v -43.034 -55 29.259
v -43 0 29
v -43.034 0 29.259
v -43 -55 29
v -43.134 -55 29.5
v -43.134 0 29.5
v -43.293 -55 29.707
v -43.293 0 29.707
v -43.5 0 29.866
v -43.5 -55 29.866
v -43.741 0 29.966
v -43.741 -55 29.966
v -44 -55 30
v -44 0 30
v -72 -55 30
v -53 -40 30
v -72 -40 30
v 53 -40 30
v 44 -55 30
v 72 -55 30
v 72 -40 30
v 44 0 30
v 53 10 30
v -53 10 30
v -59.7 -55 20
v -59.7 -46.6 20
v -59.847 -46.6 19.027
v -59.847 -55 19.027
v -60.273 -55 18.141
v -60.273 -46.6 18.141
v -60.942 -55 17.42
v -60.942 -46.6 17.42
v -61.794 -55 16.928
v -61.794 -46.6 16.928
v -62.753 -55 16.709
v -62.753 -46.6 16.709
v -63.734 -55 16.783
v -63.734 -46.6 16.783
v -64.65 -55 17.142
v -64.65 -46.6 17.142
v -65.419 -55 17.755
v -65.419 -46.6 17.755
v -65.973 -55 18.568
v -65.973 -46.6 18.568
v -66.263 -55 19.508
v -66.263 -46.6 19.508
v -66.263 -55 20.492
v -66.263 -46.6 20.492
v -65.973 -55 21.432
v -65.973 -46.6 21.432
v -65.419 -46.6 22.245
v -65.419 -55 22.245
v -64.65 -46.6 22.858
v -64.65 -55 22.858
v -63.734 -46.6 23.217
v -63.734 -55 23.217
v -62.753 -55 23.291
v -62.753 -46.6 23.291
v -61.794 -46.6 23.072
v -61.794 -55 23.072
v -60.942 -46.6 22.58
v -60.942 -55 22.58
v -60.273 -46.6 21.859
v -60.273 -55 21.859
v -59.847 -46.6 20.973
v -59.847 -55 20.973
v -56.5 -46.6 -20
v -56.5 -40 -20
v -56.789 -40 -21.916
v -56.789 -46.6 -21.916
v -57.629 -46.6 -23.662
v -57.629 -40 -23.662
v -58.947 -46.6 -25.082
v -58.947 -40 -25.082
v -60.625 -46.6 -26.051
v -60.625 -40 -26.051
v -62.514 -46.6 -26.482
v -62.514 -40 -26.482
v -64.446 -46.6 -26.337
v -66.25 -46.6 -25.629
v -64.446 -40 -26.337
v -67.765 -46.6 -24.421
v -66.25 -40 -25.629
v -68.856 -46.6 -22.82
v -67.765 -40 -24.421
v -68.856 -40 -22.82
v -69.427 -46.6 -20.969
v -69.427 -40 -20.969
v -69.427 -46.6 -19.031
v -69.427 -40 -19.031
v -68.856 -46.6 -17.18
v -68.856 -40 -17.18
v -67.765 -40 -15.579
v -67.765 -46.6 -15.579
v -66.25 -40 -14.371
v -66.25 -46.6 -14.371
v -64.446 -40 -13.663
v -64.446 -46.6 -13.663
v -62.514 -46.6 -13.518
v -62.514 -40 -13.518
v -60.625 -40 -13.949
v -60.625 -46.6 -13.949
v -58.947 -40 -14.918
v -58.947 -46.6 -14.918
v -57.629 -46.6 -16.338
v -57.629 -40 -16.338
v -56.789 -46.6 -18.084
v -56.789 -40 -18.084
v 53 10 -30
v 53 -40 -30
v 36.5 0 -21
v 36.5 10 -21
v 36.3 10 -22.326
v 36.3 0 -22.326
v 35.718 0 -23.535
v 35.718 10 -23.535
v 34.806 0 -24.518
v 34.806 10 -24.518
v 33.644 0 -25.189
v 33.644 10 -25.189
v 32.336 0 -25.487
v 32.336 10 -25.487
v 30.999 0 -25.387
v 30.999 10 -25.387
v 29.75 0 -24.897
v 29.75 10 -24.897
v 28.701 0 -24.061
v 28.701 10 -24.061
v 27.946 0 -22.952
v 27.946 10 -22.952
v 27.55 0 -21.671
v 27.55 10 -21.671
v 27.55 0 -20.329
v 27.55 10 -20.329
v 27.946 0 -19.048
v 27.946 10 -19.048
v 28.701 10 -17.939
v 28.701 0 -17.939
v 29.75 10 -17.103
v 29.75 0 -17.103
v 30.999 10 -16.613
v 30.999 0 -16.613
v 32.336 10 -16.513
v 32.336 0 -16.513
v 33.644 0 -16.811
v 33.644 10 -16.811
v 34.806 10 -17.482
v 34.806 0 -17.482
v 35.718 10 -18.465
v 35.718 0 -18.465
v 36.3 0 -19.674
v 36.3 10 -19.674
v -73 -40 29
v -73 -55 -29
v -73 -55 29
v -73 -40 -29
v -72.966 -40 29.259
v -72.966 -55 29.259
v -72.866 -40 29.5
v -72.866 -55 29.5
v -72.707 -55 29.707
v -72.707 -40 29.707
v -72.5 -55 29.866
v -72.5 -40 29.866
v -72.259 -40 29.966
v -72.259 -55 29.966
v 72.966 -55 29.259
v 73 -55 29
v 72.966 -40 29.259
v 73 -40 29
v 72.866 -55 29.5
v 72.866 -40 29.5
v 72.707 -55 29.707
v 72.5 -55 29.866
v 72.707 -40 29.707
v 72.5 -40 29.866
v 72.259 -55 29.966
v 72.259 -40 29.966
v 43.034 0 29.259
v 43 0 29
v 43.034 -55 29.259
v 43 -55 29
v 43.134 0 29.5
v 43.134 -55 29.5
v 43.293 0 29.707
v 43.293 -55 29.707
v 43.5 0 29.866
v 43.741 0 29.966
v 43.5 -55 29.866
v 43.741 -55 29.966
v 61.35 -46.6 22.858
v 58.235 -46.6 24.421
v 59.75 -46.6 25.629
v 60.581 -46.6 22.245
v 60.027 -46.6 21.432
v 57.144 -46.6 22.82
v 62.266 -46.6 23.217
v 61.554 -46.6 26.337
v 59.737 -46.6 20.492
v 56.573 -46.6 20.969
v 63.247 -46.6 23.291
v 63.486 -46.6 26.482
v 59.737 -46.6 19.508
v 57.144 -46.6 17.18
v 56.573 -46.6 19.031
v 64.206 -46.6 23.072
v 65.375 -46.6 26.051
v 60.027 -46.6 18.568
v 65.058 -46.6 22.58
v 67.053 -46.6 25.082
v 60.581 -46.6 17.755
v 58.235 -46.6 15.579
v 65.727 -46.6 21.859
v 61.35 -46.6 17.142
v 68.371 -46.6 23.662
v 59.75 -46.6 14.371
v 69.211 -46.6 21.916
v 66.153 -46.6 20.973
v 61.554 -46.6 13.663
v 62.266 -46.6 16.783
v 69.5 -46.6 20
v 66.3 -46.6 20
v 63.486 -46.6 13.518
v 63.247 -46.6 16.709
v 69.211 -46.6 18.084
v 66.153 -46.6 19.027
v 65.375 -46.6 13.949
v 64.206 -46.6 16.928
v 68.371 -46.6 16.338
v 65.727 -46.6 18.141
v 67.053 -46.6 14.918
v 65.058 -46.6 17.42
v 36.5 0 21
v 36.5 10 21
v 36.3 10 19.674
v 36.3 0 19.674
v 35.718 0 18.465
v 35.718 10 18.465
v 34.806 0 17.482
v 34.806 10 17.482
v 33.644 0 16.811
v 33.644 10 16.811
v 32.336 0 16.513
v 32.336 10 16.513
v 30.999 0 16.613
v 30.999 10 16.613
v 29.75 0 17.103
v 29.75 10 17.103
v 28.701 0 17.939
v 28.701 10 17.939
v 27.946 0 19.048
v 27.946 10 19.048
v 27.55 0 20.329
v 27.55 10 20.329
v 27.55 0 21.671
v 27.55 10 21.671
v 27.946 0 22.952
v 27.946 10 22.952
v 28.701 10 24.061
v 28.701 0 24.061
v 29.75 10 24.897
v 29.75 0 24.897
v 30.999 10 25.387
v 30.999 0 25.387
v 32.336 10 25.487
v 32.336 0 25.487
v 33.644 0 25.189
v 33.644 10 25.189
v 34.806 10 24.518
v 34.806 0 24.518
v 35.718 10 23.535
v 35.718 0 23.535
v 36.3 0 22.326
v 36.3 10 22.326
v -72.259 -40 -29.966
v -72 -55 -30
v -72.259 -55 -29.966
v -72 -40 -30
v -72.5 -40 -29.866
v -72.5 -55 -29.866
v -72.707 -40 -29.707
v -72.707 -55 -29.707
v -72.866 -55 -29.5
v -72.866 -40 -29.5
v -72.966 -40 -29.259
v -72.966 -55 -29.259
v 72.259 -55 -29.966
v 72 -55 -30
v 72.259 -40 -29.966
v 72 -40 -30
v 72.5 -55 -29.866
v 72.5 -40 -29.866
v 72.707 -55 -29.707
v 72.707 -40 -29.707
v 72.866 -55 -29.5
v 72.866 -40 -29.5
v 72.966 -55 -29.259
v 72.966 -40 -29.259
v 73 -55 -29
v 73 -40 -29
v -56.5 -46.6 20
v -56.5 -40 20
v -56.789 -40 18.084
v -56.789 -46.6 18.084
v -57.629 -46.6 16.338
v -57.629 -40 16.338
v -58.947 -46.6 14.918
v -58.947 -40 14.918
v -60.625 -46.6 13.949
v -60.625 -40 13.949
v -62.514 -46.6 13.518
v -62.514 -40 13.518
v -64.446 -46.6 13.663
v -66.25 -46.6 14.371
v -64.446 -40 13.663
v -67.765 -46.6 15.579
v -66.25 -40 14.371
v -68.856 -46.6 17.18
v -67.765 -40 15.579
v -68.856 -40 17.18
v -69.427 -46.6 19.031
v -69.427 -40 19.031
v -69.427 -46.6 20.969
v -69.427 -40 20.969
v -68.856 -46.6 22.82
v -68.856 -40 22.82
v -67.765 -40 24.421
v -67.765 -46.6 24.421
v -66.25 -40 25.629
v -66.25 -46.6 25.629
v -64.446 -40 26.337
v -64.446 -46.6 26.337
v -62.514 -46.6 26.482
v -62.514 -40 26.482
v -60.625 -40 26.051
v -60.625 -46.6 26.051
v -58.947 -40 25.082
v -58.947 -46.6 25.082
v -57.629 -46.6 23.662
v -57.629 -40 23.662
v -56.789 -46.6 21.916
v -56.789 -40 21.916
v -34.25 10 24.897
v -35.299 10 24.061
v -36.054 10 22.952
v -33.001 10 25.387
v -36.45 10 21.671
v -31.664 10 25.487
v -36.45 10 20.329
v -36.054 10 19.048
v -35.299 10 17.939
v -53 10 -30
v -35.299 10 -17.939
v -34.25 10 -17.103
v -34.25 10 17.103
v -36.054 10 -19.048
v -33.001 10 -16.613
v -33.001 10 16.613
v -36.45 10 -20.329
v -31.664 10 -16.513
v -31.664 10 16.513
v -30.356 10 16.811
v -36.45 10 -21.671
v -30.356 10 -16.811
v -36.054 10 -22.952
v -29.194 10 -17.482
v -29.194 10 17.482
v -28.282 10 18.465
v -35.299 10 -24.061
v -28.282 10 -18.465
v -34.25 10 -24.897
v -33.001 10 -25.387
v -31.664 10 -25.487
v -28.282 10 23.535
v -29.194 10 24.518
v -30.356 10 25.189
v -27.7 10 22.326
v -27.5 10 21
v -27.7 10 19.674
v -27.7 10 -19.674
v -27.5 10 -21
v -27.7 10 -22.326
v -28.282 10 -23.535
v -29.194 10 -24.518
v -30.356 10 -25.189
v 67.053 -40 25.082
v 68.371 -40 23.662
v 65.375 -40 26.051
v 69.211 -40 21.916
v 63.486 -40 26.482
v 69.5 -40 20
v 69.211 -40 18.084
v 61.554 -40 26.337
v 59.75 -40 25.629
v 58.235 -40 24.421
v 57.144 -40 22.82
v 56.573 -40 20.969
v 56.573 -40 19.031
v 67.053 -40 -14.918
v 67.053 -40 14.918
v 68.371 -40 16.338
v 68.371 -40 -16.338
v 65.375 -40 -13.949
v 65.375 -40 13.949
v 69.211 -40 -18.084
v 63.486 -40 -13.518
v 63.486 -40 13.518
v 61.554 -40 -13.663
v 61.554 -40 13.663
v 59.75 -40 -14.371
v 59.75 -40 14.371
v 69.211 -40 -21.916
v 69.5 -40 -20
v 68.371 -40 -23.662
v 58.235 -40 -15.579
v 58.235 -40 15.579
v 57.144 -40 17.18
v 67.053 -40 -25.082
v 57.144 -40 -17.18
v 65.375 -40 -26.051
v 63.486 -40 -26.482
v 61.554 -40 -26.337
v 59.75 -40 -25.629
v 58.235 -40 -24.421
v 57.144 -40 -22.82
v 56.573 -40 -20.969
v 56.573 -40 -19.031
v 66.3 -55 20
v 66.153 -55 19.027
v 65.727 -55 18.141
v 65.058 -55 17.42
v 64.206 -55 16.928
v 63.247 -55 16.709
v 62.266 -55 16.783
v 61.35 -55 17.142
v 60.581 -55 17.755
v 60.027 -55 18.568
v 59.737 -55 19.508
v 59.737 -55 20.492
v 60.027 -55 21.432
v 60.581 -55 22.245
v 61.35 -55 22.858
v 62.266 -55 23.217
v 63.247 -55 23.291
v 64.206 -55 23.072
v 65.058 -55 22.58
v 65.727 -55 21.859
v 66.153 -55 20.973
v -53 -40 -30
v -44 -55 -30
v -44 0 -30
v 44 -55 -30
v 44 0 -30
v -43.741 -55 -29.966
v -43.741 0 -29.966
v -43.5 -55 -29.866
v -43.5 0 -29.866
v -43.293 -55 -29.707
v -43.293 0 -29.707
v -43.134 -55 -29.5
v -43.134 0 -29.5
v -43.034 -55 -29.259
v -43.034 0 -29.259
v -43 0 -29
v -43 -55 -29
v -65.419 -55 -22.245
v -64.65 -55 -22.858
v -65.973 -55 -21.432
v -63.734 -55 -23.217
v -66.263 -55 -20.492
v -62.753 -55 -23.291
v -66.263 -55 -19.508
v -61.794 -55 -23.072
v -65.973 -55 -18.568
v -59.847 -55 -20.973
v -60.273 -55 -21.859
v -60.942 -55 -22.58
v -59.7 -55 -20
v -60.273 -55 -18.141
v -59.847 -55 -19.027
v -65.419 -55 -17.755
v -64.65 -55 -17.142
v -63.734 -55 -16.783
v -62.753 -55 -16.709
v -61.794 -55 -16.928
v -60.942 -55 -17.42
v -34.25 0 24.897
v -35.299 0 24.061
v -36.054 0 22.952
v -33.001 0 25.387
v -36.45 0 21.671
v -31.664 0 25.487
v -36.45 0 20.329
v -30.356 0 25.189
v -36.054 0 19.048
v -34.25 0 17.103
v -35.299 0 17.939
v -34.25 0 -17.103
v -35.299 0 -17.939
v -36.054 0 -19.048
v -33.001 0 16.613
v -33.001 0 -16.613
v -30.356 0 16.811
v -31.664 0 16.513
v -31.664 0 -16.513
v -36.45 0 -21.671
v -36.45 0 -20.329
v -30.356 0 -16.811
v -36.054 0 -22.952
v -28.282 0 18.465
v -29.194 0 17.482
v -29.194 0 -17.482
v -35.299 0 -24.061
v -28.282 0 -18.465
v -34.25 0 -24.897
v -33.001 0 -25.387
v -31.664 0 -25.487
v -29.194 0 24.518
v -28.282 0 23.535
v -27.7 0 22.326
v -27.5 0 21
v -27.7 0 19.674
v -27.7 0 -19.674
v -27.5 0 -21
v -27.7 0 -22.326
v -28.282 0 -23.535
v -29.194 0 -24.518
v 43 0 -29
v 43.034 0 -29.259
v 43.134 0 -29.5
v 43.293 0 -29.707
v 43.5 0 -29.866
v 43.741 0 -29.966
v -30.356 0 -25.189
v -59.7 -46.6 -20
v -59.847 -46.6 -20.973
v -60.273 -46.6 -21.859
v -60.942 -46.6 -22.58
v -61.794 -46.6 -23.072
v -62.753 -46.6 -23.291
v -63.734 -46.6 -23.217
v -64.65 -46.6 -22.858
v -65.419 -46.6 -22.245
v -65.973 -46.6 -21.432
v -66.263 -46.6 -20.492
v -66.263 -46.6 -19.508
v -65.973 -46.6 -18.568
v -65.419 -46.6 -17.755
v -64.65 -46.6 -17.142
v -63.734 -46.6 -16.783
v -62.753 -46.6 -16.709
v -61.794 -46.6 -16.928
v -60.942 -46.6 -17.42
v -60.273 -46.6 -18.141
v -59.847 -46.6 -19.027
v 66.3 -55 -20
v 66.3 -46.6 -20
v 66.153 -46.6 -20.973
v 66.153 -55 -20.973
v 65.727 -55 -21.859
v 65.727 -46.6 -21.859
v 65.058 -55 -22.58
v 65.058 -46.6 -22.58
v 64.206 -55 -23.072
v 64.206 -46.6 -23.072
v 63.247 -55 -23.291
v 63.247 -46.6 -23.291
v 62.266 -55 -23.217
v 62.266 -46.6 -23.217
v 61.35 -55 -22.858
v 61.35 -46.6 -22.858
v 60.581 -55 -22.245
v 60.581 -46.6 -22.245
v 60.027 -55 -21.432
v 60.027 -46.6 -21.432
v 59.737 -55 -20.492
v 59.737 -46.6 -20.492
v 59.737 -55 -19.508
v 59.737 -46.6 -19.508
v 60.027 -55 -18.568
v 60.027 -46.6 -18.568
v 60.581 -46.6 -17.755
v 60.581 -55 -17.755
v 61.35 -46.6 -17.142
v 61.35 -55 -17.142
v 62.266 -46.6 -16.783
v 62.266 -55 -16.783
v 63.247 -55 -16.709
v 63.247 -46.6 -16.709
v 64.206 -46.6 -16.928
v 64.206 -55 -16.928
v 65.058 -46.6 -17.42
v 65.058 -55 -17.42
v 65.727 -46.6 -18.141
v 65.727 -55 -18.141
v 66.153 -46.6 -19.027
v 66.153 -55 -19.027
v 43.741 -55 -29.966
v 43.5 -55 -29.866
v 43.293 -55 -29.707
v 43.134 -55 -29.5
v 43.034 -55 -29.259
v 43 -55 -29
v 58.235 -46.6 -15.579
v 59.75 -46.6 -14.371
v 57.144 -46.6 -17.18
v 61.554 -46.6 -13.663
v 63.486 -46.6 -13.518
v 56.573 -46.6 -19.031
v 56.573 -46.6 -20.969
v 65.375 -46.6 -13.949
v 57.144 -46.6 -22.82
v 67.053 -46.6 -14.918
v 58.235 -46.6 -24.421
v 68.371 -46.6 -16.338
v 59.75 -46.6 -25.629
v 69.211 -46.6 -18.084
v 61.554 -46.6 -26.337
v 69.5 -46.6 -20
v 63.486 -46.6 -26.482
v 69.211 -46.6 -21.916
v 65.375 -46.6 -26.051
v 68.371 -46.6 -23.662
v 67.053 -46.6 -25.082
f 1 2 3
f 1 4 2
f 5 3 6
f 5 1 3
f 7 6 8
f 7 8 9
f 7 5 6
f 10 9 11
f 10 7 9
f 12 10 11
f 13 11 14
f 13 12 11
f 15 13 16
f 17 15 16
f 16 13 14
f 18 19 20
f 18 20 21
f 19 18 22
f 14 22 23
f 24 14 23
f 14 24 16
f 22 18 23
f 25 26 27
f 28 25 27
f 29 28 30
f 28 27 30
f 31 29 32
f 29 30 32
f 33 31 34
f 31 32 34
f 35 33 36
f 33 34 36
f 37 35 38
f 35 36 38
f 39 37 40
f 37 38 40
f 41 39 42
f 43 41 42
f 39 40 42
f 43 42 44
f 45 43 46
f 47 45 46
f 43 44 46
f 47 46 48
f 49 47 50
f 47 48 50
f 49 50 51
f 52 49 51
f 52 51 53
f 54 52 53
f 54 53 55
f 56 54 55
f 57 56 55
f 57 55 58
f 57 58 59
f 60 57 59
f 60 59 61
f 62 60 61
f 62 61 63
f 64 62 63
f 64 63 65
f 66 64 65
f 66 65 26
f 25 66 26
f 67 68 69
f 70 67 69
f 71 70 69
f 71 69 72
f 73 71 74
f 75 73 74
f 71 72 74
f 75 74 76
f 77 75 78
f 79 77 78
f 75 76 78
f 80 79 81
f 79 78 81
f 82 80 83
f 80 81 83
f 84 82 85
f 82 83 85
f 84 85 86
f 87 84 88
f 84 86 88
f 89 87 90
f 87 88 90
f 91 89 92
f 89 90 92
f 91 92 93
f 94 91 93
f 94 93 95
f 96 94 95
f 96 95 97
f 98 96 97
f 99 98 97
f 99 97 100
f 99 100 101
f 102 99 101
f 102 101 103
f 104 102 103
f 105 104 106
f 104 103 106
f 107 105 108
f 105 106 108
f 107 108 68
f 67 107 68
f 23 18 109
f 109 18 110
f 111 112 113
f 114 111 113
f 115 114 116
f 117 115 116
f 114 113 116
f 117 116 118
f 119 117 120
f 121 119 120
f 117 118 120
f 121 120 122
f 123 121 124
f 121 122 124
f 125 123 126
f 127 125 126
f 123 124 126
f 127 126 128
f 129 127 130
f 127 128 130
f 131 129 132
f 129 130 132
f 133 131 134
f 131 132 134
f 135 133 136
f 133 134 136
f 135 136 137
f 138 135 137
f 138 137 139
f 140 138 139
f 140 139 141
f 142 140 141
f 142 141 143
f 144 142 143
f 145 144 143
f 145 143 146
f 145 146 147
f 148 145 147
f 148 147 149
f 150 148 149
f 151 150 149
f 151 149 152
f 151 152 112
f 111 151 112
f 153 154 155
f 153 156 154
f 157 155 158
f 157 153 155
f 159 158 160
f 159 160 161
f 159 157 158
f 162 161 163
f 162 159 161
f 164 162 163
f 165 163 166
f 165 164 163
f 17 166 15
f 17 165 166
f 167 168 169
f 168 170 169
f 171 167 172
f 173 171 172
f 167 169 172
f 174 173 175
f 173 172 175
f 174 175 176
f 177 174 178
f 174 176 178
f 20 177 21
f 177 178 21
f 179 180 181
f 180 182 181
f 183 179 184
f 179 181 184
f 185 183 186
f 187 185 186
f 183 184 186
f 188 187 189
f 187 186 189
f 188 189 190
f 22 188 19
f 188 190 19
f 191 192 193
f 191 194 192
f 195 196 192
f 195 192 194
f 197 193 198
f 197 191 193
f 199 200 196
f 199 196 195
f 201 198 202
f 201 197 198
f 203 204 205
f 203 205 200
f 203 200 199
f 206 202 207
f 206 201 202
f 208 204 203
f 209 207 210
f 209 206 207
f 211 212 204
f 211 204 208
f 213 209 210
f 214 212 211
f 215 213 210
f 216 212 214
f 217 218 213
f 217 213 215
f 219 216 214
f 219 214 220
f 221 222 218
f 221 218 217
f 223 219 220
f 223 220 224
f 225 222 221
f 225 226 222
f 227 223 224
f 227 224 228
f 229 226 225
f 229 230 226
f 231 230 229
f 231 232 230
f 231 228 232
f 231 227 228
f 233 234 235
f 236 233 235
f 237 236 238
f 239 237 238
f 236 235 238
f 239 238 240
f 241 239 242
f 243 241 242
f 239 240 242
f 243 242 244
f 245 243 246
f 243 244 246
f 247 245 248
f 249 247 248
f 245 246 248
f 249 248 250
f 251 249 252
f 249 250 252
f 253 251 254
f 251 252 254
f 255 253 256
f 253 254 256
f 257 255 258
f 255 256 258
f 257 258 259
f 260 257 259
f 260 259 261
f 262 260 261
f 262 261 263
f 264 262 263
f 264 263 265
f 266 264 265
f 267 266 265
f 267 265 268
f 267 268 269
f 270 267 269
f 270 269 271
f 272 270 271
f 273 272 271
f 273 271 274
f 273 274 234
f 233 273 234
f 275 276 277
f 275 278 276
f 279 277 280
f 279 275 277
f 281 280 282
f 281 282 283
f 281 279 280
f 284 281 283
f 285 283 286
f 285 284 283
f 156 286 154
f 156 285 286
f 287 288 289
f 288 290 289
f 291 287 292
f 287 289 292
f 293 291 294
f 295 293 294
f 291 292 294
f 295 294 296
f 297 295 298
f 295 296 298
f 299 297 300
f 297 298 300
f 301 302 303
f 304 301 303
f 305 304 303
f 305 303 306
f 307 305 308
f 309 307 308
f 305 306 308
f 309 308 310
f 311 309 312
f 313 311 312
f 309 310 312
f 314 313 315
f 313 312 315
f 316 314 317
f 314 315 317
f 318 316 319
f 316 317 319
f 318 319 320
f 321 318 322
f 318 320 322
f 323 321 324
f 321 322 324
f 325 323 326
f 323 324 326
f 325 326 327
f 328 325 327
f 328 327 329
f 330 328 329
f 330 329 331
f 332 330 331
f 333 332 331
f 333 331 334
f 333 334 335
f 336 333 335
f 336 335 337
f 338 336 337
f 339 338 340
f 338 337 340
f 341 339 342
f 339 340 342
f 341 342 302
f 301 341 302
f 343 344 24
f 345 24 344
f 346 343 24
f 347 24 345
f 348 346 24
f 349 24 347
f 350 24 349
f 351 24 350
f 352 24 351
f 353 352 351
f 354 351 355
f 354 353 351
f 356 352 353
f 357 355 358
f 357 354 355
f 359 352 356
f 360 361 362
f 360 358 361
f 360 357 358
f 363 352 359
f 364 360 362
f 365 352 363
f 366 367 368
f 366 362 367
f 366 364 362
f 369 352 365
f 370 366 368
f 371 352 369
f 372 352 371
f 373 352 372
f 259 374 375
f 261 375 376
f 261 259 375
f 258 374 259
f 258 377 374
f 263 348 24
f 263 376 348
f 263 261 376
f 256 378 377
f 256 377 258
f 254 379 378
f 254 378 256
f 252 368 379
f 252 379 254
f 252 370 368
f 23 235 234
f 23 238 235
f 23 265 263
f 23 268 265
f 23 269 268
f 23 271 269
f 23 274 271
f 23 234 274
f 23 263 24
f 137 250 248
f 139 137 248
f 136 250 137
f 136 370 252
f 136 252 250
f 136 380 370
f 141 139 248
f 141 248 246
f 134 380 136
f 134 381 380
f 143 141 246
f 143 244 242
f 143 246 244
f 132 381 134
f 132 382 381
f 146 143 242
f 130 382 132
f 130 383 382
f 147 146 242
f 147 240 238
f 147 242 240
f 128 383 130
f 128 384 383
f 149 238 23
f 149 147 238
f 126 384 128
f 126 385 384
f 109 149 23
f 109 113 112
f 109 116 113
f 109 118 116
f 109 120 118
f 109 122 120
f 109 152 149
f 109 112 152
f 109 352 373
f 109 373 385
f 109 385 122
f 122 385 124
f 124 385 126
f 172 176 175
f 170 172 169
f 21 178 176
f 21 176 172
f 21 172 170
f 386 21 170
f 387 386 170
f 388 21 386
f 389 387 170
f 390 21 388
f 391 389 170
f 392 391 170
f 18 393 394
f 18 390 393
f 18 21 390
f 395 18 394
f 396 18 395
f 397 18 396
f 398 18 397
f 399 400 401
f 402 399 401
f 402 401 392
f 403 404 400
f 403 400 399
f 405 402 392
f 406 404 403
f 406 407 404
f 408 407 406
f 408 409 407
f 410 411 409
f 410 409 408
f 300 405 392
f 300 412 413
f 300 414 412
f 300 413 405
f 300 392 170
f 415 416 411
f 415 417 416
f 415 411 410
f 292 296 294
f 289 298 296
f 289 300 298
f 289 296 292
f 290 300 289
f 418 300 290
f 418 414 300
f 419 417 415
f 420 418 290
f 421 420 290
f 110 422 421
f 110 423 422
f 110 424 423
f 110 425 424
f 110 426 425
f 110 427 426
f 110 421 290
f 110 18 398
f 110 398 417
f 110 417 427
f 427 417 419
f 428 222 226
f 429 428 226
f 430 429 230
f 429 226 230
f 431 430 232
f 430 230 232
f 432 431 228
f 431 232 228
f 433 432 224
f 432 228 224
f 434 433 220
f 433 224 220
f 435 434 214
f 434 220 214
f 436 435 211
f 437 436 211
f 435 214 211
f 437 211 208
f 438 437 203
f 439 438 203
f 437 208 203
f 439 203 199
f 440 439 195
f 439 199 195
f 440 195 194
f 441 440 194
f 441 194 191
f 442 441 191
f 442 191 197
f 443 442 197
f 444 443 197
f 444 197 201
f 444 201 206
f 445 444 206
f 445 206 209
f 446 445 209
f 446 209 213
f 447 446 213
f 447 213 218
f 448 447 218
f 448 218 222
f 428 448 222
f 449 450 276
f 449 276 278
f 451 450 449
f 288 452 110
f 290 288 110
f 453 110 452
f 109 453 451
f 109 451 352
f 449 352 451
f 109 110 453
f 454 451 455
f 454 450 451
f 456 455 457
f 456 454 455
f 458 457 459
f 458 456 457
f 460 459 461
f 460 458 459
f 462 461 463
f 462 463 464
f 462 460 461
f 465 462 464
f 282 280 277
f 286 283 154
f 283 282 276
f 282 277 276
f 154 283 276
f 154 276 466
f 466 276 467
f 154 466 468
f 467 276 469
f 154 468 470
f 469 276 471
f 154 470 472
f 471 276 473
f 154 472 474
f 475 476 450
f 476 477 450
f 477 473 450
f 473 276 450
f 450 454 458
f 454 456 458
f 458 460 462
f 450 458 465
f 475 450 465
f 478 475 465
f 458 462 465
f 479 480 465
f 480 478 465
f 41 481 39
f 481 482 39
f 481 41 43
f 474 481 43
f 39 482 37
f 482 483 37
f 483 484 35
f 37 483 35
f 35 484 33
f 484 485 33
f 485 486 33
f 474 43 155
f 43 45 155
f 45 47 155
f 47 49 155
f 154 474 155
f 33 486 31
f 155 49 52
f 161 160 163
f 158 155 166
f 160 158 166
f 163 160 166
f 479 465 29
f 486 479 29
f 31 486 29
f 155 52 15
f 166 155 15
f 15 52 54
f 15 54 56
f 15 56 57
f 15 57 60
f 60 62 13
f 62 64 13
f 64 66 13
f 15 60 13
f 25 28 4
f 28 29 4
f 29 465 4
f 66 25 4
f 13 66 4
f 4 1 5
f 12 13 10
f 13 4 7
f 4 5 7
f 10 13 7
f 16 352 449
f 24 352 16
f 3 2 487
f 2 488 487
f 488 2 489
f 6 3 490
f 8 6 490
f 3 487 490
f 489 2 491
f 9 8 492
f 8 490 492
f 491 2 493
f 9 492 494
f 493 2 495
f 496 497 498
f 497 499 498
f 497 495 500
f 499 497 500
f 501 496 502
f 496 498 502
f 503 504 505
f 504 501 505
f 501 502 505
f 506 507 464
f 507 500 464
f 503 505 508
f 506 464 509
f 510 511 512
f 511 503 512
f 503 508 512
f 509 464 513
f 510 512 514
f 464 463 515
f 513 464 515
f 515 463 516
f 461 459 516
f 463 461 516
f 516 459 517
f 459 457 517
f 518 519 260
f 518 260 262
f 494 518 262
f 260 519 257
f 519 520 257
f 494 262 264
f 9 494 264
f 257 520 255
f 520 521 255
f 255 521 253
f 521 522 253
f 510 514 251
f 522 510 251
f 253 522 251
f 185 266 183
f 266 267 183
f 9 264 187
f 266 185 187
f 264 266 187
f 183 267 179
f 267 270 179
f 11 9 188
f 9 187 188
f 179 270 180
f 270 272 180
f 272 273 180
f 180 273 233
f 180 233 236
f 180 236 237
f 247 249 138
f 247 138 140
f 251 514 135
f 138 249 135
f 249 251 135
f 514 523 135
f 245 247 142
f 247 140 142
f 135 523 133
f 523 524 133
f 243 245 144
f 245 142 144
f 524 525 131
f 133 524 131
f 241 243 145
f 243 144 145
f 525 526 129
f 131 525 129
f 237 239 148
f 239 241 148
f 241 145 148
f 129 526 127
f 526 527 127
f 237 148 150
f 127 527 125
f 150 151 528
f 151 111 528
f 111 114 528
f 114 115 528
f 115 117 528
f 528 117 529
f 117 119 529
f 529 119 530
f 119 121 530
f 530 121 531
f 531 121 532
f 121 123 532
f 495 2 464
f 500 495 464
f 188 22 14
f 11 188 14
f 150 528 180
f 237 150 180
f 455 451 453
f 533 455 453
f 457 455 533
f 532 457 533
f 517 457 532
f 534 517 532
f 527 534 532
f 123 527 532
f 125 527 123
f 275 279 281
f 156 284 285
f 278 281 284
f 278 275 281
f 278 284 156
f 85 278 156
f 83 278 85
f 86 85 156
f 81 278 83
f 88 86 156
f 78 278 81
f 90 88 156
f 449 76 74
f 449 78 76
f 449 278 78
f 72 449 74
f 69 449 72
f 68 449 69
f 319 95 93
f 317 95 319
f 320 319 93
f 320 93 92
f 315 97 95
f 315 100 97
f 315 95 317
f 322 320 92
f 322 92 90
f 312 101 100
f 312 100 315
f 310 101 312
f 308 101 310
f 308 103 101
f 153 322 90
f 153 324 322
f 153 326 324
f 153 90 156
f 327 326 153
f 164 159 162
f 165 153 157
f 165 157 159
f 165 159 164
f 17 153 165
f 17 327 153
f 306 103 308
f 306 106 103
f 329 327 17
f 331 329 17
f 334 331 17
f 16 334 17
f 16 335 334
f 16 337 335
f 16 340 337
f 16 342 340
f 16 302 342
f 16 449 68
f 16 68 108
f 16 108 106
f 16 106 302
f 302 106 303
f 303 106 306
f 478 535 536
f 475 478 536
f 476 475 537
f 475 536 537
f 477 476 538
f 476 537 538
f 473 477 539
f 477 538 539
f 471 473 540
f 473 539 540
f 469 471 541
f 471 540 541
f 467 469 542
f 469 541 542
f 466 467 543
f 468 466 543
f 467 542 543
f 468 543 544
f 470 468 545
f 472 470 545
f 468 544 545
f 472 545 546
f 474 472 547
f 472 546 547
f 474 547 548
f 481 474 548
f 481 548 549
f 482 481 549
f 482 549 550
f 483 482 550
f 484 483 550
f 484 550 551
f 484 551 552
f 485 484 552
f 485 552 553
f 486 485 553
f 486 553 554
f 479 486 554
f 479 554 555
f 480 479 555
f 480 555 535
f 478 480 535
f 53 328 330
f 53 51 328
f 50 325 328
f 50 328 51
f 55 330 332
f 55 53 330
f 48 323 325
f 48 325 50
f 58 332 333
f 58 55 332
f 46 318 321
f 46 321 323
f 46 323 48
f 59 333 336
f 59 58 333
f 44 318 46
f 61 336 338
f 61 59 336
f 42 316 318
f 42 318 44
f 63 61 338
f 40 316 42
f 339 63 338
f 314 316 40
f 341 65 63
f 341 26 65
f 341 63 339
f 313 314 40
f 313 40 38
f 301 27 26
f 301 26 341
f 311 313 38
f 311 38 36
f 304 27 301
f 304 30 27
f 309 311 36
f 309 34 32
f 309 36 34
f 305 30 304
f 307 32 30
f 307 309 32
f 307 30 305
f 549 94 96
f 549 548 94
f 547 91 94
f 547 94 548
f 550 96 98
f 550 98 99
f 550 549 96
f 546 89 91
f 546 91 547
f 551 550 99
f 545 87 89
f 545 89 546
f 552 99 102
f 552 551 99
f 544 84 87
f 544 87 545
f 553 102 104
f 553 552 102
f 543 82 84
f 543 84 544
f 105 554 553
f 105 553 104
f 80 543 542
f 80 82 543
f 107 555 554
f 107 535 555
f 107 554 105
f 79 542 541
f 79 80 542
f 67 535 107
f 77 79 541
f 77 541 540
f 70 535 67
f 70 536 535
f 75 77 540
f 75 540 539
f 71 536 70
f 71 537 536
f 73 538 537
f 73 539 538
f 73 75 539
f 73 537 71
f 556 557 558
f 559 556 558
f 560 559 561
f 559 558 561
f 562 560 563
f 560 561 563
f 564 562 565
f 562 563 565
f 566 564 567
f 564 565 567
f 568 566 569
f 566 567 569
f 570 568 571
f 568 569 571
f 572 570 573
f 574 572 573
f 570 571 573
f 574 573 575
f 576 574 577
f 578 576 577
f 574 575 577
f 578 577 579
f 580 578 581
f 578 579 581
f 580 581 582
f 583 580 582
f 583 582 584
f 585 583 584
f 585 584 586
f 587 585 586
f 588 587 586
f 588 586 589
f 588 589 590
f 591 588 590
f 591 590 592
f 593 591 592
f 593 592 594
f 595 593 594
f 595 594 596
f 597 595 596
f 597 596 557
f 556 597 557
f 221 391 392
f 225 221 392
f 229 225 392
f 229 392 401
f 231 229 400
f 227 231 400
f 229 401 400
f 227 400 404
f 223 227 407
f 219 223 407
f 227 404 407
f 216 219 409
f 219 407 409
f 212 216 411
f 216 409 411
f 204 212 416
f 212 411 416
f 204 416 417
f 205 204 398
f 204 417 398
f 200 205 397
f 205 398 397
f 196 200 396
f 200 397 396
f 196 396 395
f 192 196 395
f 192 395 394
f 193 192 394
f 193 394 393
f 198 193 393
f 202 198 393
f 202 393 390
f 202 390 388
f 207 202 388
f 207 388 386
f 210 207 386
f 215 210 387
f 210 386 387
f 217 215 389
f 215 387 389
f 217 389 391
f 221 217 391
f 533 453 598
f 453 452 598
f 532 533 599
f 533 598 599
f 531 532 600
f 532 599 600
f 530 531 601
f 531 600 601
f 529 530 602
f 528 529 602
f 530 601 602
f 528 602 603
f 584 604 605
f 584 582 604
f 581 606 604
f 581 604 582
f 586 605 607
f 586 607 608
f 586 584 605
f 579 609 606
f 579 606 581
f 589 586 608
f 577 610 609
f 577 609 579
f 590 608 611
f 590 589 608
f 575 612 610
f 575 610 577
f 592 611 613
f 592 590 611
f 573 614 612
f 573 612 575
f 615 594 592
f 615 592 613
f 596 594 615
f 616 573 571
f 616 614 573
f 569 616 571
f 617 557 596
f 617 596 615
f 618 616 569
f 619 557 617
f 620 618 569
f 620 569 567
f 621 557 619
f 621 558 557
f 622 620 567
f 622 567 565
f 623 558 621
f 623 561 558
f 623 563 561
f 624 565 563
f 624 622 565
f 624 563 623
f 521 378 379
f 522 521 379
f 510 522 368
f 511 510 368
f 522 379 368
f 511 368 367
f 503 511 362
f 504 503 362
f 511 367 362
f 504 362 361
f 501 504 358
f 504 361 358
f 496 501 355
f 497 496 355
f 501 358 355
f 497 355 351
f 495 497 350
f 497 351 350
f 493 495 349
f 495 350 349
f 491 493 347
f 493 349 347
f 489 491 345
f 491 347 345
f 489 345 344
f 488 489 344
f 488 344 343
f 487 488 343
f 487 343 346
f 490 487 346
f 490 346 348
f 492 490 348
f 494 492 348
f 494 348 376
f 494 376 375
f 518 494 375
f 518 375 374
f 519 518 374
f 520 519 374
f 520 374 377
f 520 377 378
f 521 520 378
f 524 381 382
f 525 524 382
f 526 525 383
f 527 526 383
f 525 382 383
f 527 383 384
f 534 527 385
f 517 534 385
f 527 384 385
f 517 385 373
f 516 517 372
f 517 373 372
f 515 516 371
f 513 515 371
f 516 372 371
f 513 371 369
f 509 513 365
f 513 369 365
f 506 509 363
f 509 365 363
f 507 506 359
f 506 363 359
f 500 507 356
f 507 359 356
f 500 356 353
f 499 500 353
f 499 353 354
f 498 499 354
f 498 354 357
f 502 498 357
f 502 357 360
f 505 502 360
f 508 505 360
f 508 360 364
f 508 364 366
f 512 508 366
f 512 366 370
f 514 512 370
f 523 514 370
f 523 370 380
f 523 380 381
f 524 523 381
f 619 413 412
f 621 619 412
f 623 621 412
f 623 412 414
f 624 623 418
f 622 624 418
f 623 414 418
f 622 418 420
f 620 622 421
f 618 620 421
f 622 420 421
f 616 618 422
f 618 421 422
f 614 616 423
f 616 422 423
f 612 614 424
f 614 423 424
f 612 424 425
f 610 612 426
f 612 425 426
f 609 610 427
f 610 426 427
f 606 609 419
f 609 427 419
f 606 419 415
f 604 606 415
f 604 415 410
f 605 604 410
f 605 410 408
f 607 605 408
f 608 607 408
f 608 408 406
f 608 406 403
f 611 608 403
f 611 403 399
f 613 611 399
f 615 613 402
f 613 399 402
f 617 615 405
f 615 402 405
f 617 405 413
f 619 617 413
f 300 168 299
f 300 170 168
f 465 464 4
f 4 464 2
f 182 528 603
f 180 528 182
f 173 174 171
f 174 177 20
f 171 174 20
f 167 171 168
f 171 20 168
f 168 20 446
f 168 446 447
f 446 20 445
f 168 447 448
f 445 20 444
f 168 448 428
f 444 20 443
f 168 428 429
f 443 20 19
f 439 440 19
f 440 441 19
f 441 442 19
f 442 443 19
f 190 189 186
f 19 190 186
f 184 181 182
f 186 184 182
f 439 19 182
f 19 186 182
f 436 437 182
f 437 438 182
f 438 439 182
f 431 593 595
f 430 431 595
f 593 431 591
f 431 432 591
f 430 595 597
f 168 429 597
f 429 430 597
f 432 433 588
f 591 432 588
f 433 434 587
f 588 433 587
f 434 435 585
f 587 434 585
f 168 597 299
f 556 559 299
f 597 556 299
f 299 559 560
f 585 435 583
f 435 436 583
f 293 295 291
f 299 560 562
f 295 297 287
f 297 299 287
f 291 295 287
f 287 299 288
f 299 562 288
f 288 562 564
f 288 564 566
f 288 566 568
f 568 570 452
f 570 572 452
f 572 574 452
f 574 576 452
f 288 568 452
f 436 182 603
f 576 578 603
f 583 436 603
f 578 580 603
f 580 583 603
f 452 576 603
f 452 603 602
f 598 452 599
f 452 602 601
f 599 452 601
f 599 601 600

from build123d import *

# Parameters (mm, degrees)
SKETCH1_W           = 106
SKETCH1_H           = 60
BOSS_EXTRUDE1_DEPTH = 10
SKETCH2_W           = 10
SKETCH2_H           = 60
BOSS_EXTRUDE2_DEPTH = 55
SKETCH3_W           = 60
SKETCH3_H           = 15
BOSS_EXTRUDE3_DEPTH = 20
SKETCH4_W           = 60
SKETCH4_H           = 15
BOSS_EXTRUDE4_DEPTH = 20
SKETCH5_R           = 4.5
CUT_EXTRUDE1_DEPTH  = 66
SKETCH6_R           = 6.5
CUT_EXTRUDE2_DEPTH  = 6.6
SKETCH7_R           = 3.3
CUT_EXTRUDE3_DEPTH  = 9.4
FILLET1_R           = 1


with BuildPart() as part:
    # Sketch1 → Boss-Extrude1 (new body)
    with BuildSketch(Plane(origin=(0, 0, 0), x_dir=(1, 0, 0), z_dir=(0, 1, 0))):
        Rectangle(SKETCH1_W, SKETCH1_H)
    extrude(amount=BOSS_EXTRUDE1_DEPTH)

    # Sketch2 → Boss-Extrude2 (add)
    with BuildSketch(Plane.XZ):
        with Locations((-48, 0)):
            Rectangle(SKETCH2_W, SKETCH2_H)
        with Locations((48, 0)):
            Rectangle(SKETCH2_W, SKETCH2_H)
    extrude(amount=BOSS_EXTRUDE2_DEPTH)

    # Sketch3 → Boss-Extrude3 (add)
    with BuildSketch(Plane(origin=(53, 0, 0), x_dir=(0, 0, -1), z_dir=(1, 0, 0))):
        with Locations((0, -47.5)):
            Rectangle(SKETCH3_W, SKETCH3_H)
    extrude(amount=BOSS_EXTRUDE3_DEPTH)

    # Sketch4 → Boss-Extrude4 (add)
    with BuildSketch(Plane.ZY.offset(53)):
        with Locations((0, -47.5)):
            Rectangle(SKETCH4_W, SKETCH4_H)
    extrude(amount=BOSS_EXTRUDE4_DEPTH)

    # Sketch5 → Cut-Extrude1 (cut, through all)
    with BuildSketch(Plane(origin=(0, 10, 0), x_dir=(1, 0, 0), z_dir=(0, 1, 0))):
        with Locations((-32, 21)):
            Circle(SKETCH5_R)
        with Locations((32, 21)):
            Circle(SKETCH5_R)
        with Locations((32, -21)):
            Circle(SKETCH5_R)
        with Locations((-32, -21)):
            Circle(SKETCH5_R)
    extrude(amount=-CUT_EXTRUDE1_DEPTH, mode=Mode.SUBTRACT)

    # Sketch6 → Cut-Extrude2 (cut)
    with BuildSketch(Plane(origin=(0, -40, 0), x_dir=(1, 0, 0), z_dir=(0, 1, 0))):
        with Locations((63, 20)):
            Circle(SKETCH6_R)
        with Locations((63, -20)):
            Circle(SKETCH6_R)
        with Locations((-63, 20)):
            Circle(SKETCH6_R)
        with Locations((-63, -20)):
            Circle(SKETCH6_R)
    extrude(amount=-CUT_EXTRUDE2_DEPTH, mode=Mode.SUBTRACT)

    # Sketch7 → Cut-Extrude3 (cut, through all)
    with BuildSketch(Plane(origin=(0, -46.6, 0), x_dir=(1, 0, 0), z_dir=(0, 1, 0))):
        with Locations((-63, 20)):
            Circle(SKETCH7_R)
        with Locations((-63, -20)):
            Circle(SKETCH7_R)
        with Locations((63, -20)):
            Circle(SKETCH7_R)
        with Locations((63, 20)):
            Circle(SKETCH7_R)
    extrude(amount=-CUT_EXTRUDE3_DEPTH, mode=Mode.SUBTRACT)

    # Fillet1
    fillet1_edges = [part.edges().sort_by_distance(p)[0] for p in [
        (-43, -27.5, -30),
        (-43, -27.5, 30),
        (43, -27.5, 30),
        (43, -27.5, -30),
        (73, -47.5, 30),
        (73, -47.5, -30),
        (-73, -47.5, -30),
        (-73, -47.5, 30),
    ]]
    fillet(fillet1_edges, radius=FILLET1_R)


solid = part.part
